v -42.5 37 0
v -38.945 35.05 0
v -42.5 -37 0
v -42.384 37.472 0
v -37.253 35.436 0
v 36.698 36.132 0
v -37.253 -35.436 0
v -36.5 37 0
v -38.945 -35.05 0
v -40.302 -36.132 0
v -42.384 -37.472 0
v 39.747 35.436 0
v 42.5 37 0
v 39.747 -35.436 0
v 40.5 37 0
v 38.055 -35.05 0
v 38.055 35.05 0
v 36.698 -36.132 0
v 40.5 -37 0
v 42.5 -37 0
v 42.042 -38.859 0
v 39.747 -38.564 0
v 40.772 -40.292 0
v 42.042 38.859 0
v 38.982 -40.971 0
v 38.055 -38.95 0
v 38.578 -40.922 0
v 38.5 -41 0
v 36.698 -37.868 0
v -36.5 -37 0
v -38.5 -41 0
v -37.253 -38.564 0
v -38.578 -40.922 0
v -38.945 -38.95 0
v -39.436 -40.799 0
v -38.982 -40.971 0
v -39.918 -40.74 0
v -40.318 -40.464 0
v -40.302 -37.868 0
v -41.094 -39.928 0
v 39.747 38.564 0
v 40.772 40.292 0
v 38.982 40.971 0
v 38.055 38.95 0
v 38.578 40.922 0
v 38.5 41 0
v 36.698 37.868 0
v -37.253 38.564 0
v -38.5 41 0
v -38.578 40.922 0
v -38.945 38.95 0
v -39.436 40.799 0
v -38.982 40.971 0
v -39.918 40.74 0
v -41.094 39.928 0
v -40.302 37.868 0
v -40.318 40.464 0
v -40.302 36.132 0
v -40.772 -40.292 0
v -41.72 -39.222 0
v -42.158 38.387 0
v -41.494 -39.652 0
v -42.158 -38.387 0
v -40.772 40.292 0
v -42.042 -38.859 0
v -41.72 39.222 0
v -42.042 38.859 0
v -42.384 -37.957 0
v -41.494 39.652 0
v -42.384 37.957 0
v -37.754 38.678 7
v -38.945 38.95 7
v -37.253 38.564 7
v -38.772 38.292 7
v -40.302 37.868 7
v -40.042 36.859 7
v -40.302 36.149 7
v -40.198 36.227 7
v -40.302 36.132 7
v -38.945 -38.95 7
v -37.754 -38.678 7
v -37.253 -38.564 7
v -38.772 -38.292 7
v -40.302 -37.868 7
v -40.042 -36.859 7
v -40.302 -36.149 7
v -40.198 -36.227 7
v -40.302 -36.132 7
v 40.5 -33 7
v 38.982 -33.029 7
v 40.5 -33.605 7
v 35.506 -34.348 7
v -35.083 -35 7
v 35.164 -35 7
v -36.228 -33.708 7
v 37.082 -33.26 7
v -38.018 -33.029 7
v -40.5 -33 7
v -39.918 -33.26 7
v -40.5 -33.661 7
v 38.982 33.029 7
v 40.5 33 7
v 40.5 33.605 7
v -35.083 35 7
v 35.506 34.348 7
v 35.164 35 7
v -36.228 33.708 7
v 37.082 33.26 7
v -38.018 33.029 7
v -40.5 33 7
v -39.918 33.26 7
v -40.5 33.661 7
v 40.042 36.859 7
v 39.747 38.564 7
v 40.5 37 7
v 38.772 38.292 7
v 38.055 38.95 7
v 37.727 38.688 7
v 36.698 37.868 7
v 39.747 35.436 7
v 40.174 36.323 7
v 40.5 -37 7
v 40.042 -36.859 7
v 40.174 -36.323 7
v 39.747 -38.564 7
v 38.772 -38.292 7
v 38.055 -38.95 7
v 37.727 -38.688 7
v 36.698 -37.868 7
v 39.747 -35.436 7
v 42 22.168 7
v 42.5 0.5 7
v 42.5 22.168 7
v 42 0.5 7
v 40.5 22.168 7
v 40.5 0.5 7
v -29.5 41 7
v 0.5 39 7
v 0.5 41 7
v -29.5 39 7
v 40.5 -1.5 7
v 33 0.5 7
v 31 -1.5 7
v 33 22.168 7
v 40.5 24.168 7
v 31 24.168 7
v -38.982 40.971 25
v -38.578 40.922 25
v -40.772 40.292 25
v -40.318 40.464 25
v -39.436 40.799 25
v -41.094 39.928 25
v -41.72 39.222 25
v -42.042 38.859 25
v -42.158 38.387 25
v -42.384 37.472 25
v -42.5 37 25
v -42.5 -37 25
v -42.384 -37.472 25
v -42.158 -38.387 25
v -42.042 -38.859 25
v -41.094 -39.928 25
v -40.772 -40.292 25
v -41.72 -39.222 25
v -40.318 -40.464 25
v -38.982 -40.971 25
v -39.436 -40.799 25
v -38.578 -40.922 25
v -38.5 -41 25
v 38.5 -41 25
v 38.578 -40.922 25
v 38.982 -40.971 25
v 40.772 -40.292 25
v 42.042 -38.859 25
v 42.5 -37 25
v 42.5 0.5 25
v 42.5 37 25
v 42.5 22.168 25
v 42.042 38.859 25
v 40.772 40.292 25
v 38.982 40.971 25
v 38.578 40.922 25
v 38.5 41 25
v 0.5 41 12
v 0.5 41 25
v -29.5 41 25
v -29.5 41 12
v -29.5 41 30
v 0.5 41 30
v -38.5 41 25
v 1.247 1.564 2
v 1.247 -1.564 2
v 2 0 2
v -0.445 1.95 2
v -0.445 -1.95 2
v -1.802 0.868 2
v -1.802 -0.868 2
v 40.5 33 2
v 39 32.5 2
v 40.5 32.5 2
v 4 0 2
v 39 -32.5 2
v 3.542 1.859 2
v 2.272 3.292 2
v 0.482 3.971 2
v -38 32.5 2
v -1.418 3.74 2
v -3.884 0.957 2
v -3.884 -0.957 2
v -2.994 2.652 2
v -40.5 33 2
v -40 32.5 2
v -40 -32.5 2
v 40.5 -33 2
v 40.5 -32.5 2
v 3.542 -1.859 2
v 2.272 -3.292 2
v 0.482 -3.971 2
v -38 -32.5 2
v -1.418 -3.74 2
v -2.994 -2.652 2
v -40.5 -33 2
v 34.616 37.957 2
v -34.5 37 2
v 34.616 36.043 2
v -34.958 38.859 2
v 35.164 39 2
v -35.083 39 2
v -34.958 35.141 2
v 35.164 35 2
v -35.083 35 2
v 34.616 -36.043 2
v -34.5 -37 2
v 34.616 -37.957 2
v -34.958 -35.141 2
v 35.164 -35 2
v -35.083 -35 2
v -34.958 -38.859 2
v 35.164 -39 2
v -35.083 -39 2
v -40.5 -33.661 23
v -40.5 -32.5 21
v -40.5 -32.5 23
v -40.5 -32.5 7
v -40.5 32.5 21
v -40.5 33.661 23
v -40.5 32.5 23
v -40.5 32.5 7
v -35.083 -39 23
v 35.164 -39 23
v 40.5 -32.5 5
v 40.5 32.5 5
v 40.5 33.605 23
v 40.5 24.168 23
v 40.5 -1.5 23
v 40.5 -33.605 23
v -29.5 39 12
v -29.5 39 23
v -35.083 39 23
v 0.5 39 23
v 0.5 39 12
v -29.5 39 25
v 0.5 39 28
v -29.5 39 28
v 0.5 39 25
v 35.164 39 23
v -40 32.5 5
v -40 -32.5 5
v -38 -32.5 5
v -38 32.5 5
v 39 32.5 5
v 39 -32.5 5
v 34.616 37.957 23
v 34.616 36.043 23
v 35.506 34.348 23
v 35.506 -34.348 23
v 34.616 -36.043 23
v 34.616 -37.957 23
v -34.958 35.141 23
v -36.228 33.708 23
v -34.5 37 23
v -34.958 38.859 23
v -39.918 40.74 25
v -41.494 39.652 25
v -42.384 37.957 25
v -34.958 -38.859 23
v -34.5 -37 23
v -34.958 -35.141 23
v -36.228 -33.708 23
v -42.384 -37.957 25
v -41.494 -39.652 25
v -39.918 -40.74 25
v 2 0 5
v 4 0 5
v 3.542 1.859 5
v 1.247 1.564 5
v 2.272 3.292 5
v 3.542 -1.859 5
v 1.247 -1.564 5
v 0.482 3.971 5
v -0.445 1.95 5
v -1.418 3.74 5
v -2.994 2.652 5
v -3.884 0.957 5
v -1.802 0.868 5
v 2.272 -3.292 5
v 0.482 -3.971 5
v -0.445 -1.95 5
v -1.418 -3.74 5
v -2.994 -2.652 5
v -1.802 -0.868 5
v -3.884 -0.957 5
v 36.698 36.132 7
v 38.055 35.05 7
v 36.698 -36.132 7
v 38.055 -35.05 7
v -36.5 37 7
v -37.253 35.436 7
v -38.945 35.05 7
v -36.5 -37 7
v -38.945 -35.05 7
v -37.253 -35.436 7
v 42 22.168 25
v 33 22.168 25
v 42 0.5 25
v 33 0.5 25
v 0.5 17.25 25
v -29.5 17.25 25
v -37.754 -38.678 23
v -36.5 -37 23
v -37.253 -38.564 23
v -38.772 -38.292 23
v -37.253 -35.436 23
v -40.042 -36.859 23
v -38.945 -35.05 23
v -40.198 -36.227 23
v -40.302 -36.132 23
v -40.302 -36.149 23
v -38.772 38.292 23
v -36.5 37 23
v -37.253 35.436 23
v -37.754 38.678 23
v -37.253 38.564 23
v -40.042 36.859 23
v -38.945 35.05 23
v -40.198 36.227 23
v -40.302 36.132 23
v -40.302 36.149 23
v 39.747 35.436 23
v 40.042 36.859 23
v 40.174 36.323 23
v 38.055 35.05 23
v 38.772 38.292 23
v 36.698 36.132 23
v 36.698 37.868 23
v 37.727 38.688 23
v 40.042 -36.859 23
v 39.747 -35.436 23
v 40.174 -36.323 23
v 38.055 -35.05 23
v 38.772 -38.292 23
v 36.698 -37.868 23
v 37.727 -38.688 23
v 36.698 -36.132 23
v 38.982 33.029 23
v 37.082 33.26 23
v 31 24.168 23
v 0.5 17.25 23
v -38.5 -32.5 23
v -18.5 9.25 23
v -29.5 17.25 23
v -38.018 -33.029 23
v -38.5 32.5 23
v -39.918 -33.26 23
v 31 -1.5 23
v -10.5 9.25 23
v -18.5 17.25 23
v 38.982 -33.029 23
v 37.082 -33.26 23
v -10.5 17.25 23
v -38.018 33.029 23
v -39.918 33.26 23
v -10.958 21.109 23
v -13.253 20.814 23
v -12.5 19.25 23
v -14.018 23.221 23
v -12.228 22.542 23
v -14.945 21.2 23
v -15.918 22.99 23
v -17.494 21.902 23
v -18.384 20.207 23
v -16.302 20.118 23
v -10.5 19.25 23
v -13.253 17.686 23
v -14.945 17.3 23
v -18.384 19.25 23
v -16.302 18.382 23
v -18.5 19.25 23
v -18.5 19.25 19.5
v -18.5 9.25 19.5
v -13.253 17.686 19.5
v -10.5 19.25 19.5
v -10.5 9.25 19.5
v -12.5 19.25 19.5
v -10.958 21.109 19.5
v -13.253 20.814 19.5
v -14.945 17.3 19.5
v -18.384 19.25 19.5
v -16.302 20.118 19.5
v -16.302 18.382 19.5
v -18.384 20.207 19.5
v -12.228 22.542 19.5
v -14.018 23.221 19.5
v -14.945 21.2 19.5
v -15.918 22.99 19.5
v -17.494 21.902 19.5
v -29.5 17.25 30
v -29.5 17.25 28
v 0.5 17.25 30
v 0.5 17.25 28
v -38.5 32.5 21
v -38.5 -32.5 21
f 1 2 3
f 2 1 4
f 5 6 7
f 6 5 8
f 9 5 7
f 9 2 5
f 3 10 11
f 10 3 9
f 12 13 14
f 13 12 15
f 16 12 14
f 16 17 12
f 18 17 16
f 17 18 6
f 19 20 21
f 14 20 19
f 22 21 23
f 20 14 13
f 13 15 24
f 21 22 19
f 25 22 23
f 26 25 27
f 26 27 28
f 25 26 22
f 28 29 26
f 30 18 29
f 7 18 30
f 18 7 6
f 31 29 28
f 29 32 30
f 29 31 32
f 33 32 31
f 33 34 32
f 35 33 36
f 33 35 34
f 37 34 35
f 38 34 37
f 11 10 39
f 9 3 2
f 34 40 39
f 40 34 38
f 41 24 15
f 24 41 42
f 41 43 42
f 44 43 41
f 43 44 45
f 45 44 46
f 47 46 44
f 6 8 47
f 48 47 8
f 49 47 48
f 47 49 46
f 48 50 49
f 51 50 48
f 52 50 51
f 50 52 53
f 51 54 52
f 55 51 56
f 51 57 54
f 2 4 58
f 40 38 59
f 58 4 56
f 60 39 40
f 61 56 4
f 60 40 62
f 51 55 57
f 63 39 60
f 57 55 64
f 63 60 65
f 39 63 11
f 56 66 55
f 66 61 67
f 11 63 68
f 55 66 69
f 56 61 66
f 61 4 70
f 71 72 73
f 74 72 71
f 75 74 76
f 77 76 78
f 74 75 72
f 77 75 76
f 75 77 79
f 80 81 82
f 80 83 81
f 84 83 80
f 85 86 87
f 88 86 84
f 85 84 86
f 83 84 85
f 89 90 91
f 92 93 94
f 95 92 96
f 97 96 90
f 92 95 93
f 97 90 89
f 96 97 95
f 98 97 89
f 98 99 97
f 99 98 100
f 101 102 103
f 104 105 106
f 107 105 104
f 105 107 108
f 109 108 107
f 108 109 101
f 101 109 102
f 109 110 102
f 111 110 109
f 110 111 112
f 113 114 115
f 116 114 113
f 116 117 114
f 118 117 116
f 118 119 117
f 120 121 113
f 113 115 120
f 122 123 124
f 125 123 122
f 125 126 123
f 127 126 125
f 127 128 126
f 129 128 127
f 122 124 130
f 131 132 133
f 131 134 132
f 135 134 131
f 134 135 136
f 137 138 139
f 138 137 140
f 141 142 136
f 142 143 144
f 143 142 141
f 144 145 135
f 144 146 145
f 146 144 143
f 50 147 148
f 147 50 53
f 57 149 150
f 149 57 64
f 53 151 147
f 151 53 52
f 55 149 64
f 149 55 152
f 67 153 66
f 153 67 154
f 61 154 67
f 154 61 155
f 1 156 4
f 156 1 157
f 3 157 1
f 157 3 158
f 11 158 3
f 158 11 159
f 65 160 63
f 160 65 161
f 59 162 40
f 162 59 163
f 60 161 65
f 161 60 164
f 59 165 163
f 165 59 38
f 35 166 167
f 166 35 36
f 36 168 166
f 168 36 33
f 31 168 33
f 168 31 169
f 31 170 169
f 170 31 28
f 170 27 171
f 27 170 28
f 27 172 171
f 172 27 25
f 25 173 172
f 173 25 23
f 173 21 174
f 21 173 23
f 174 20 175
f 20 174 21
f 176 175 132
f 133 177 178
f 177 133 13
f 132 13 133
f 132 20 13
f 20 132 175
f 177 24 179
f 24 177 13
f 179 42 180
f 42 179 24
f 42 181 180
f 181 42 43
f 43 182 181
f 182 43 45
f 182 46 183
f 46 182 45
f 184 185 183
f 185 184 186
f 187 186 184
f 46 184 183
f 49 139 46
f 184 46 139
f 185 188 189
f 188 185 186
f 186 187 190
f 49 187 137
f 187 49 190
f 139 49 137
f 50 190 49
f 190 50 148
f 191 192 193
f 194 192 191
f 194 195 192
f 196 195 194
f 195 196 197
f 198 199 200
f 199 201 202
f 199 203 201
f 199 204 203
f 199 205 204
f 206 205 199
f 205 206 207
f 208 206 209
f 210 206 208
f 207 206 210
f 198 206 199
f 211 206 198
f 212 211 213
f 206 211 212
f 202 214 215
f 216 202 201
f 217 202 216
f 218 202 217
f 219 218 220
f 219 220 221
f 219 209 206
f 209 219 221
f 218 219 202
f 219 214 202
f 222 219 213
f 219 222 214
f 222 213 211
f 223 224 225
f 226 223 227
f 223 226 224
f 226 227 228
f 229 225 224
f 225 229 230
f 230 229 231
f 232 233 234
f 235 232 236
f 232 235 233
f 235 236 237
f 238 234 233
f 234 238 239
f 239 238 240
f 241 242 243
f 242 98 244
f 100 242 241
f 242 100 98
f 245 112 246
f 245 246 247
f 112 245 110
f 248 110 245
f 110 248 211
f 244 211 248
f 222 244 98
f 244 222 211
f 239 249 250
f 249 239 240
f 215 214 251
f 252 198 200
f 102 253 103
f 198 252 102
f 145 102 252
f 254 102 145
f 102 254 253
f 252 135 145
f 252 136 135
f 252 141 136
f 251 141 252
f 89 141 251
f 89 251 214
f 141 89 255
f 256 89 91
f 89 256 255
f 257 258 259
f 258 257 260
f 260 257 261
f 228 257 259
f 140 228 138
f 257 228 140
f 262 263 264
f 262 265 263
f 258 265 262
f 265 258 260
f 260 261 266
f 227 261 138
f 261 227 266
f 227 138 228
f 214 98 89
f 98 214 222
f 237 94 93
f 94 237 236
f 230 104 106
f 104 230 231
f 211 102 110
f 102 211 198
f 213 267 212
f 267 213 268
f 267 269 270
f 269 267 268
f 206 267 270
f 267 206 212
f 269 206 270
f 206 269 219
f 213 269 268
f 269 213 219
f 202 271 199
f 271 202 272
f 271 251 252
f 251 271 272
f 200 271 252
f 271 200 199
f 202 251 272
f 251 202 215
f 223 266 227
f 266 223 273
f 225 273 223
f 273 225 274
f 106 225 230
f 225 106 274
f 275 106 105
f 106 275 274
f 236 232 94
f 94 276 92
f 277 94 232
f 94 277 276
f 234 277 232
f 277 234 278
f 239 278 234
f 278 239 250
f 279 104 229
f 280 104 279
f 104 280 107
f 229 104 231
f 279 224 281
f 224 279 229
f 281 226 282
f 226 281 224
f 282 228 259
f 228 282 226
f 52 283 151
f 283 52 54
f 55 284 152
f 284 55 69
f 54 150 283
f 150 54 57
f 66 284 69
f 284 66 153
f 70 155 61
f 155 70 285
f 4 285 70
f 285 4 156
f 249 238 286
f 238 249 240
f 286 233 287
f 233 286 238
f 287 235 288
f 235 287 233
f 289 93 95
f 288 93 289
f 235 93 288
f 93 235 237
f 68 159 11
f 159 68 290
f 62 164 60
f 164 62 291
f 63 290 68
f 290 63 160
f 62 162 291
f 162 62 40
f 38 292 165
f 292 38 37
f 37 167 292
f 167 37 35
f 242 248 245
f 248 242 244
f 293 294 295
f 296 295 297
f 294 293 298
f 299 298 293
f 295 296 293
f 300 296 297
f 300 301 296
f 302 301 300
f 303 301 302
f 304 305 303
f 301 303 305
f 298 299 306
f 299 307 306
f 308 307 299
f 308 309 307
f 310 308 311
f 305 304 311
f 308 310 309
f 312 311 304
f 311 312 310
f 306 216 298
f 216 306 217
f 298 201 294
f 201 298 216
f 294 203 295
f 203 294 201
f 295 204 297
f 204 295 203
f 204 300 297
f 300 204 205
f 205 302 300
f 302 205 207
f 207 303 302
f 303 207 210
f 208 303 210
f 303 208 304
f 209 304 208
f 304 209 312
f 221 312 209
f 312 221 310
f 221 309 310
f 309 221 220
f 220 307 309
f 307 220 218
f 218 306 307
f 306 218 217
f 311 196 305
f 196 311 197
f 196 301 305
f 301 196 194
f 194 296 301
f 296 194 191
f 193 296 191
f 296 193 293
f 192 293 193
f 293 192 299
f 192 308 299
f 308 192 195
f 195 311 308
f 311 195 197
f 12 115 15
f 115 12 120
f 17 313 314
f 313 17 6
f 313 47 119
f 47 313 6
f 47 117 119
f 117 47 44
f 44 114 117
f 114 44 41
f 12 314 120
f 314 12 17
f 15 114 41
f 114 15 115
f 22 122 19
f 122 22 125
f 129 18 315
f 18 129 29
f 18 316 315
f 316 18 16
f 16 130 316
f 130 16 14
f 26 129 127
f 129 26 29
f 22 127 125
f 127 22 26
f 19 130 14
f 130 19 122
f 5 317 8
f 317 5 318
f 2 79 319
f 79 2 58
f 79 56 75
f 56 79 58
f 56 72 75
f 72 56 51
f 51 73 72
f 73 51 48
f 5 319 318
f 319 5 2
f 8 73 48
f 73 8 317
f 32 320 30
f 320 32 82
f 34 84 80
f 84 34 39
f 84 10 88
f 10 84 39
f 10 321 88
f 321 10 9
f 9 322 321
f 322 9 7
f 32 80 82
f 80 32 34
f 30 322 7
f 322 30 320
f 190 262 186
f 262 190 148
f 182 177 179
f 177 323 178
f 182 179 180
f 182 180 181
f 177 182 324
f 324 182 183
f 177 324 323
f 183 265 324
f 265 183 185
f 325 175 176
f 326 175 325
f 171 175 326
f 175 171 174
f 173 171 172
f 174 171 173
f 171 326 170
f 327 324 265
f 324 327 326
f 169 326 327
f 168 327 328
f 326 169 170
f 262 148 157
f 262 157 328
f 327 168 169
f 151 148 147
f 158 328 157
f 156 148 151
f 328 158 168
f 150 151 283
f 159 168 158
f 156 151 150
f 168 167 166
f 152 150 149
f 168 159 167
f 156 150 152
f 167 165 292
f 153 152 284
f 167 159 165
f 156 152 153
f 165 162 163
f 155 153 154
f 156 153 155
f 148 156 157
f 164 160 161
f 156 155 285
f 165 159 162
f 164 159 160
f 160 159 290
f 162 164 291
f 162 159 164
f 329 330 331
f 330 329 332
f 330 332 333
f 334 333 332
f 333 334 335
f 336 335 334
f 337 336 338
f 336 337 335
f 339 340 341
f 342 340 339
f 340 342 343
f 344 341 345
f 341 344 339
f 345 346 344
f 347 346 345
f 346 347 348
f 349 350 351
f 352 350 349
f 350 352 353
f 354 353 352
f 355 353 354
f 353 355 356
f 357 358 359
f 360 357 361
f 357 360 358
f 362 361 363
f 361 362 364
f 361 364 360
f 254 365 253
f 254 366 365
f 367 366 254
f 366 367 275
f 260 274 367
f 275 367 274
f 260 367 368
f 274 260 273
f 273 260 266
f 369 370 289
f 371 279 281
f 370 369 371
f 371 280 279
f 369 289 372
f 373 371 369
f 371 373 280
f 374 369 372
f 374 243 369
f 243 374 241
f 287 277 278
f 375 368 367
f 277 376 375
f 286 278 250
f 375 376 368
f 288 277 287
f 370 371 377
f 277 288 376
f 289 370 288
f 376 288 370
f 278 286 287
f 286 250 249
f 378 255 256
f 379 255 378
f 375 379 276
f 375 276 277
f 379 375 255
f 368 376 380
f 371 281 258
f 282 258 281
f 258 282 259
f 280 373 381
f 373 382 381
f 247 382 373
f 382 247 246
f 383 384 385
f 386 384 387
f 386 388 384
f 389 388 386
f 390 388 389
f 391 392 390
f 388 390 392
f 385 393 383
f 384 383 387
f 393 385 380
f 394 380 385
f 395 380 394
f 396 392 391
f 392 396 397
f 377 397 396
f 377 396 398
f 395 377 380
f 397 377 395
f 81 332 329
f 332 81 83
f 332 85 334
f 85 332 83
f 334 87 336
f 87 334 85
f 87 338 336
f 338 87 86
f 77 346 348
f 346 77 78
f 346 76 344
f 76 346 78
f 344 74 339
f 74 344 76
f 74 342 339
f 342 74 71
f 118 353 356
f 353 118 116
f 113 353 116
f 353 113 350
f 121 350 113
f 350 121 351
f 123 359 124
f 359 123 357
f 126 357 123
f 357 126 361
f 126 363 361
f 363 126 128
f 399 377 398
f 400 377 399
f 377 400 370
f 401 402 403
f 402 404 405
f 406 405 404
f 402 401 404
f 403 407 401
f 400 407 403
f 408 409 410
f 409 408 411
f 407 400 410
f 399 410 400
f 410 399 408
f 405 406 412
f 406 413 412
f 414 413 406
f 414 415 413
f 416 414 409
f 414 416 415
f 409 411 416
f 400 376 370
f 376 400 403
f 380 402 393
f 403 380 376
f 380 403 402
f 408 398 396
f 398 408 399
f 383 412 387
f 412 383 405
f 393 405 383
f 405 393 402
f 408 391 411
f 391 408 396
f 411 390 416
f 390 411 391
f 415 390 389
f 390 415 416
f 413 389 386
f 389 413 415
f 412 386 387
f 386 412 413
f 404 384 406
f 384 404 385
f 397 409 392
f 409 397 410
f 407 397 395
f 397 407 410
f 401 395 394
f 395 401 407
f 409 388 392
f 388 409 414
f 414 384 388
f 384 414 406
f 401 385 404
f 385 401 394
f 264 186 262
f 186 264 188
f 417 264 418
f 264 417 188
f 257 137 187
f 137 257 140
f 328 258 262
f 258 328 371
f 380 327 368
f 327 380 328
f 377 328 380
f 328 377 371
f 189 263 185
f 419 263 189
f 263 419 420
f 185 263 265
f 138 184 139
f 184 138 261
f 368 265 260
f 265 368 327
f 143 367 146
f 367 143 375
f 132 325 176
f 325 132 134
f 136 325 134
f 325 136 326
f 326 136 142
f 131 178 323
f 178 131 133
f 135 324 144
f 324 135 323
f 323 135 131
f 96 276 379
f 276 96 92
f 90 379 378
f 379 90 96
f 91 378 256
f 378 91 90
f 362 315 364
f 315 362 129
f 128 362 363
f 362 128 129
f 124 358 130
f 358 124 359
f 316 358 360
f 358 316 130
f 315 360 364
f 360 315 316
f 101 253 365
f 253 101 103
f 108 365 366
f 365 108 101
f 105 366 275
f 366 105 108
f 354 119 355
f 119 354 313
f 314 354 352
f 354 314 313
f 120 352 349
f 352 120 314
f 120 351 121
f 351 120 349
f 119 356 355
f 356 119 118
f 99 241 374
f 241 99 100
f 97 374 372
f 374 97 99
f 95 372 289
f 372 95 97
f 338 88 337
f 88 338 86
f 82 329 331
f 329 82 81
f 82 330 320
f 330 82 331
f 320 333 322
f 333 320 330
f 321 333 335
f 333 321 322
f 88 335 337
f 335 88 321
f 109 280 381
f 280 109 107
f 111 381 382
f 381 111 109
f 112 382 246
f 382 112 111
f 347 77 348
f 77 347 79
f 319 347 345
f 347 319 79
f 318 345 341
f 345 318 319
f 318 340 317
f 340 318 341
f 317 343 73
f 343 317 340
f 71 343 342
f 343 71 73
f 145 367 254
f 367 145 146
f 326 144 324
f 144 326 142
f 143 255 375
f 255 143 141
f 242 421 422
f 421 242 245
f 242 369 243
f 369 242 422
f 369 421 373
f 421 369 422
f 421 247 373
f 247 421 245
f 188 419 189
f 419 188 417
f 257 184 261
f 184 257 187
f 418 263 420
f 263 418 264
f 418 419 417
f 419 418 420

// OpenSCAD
// file: ChassisTop.scad
// This is model of top chassis.

// below values are taken from KiCad model

SCREW_CONNECTOR_DX = 10 + COMPONENT_TOLERANCE;
SCREW_CONNECTOR_Y = 1 - COMPONENT_TOLERANCE;
SCREW_CONNECTOR_DY = 20.668 + 2*COMPONENT_TOLERANCE;

AdcPowerSupplyYOffset = PCB_X/2
                        - SCREW_CONNECTOR_DX
                        + CHASSIS_THICKNESS
                        - COMPONENT_TOLERANCE;

module ChassisTop_WallsAroundADCAndPowerSupplySocket(Height)
{
    linear_extrude(height = Height, convexity = 10, twist = 0)
    {
        translate([AdcPowerSupplyYOffset,
                    -SCREW_CONNECTOR_DY - SCREW_CONNECTOR_Y - CHASSIS_THICKNESS,
                    0])
        {
            square([SCREW_CONNECTOR_DX + COMPONENT_TOLERANCE, CHASSIS_THICKNESS]);
        }

        translate([AdcPowerSupplyYOffset,
                    -SCREW_CONNECTOR_DY - SCREW_CONNECTOR_Y + SCREW_CONNECTOR_DY,
                    0])
        {
            square([SCREW_CONNECTOR_DX + COMPONENT_TOLERANCE, CHASSIS_THICKNESS]);
        }

        translate([AdcPowerSupplyYOffset,
                    -SCREW_CONNECTOR_DY - SCREW_CONNECTOR_Y,
                    0])
        {
            square([CHASSIS_THICKNESS, SCREW_CONNECTOR_DY + CHASSIS_THICKNESS]);
        }
    }
}

module ChassisTop_SupportFrontPanel()
{
    translate([-PCB_X/2 -COMPONENT_TOLERANCE,
               -PCB_Y/2,
                CHASSIS_THICKNESS])
    {
        linear_extrude(height = CHASSIS_THICKNESS, convexity = 10, twist = 0)
        {
            square([CHASSIS_THICKNESS, PCB_Y]);
        }
    }

}

module ChassisTop_DebugPanelMountingScrewSupport()
{

    DebugPanelSupportSize = 10;

    translate([-PCB_X/2+DEBUG_CONNECTOR_X+DEBUG_CONNECTOR_DX/2,
            -PCB_Y/2+DEBUG_CONNECTOR_DY/2+COMPONENT_TOLERANCE,
            0])
    {
        difference()
        {
            union()
            {
                translate([0,DebugPanelSupportSize/2,0])
                {
                    linear_extrude(height = CHASSIS_THICKNESS+INSERT_NUT_LENGTH, convexity = 10, twist = 0)
                    {
                        square([INSERT_NUT_HOLDER_DIAMETER, DebugPanelSupportSize], center=true);
                    }
                }
                GenericChassis_InsertNutSocket(CHASSIS_THICKNESS+INSERT_NUT_LENGTH, false);
            }

            // add hole for debug socket screw
            linear_extrude(height = CHASSIS_THICKNESS+INSERT_NUT_LENGTH, convexity = 10, twist = 0)
            {
                circle(r=INSERT_NUT_RADIUS);
            }
        }
    }
}

module Chassis3DTop(Height)
{
    difference()
    {
        union()
        {
            GenericChassis(Height);
            ChassisTop_DebugPanelMountingScrewSupport();
        }

        // add hole for ADC and power supply socket
        translate([AdcPowerSupplyYOffset,
                    -SCREW_CONNECTOR_DY - SCREW_CONNECTOR_Y,
                    0])
        {
            linear_extrude(height = Height, convexity = 10, twist = 0)
            {
                square([SCREW_CONNECTOR_DX + CHASSIS_THICKNESS, SCREW_CONNECTOR_DY]);
            }
        }

        // add hole for flashing and UART sockets
        DebugPanel(Height);

        // add hole for front pannel
        translate([-PCB_X/2 - CHASSIS_THICKNESS-COMPONENT_TOLERANCE,
                   -PCB_Y/2,
                    CHASSIS_THICKNESS])
        {
            GenericFrontPanel();
        }
    }

    ChassisTop_WallsAroundADCAndPowerSupplySocket(Height);
    ChassisTop_SupportFrontPanel();

    // add nounting screws
    InsertNutSockets(Height, false);
}
// file: ChassisBottom.scad
// This is model of bottom chassis.

module ChassisBottom_FrontPanel(Height)
{
    translate([-PCB_X/2 - CHASSIS_THICKNESS-COMPONENT_TOLERANCE,
                -PCB_Y/2,
                Height])
    {
        GenericFrontPanel();
    }
}

module ChassisBottom_SupportAroundPCB()
{
    linear_extrude(height = 2*CHASSIS_THICKNESS+PCB_Z_OFFSET, convexity = 10, twist = 0)
    {
        square([PCB_X+2*COMPONENT_TOLERANCE, CHASSIS_THICKNESS]);
    }
}

module ChassisBottom_SupportsAroundPCB()
{
    translate([-PCB_X/2 -COMPONENT_TOLERANCE,
                -PCB_Y/2-CHASSIS_THICKNESS-COMPONENT_TOLERANCE,
                0])
    {
        ChassisBottom_SupportAroundPCB();
    }

    translate([-PCB_X/2 - COMPONENT_TOLERANCE,
                PCB_Y/2+COMPONENT_TOLERANCE,
                0])
    {
        ChassisBottom_SupportAroundPCB();
    }
}

module ChassisBottom_PCBMountingHole()
{
    translate([0,
                0,
                CHASSIS_THICKNESS])
    {
        GenericChassis_InsertNutSocket(PCB_Z_OFFSET, false);
    }
}

module ChassisBottom_PCBBottomHolder()
{
    PCBBottomHolderThickness = 2;

    linear_extrude(height = PCB_Z_OFFSET, convexity = 10, twist = 0)
    {
        square([PCBBottomHolderThickness, PCB_Y]);
    }
}

module ChassisBottom_PCBBottomHolders()
{
    translate([-PCB_X/2,
                -PCB_Y/2,
                CHASSIS_THICKNESS])
    {
        ChassisBottom_PCBBottomHolder();
    }

    translate([PCB_X/2-1,
                -PCB_Y/2,
                CHASSIS_THICKNESS])
    {
        ChassisBottom_PCBBottomHolder();
    }
}

module ChassisBottom(Height)
{
    difference()
    {
        union()
        {
            GenericChassis(Height);
            ChassisBottom_FrontPanel(Height);
            ChassisBottom_SupportsAroundPCB();
            ChassisBottom_PCBMountingHole();
            ChassisBottom_PCBBottomHolders();

            InsertNutSockets(Height, false);
        }

        // add mounting for top and bottom chassis
        InsertNutSockets(Height, true);
    }
}
// file: GenericFrontPanel.scad
// This is model of panel where BNC, LCD and encoder are.

module GenericFrontPanel()
{
    linear_extrude(height = TOP_CHASSIS_HEIGHT-CHASSIS_THICKNESS, convexity = 10, twist = 0)
    {
        square([CHASSIS_THICKNESS, PCB_Y]);
    }
}
// file: GenericChassis.scad
module Chassis2DQuarter(Thickness)
{
    CHASSIS_X = PCB_X/2 + COMPONENT_TOLERANCE + Thickness;
    CHASSIS_Y = PCB_Y/2 + COMPONENT_TOLERANCE + Thickness;

    polygon(points=[
        [0, 0],
        [CHASSIS_X, 0],
        [CHASSIS_X, CHASSIS_Y + CHASSIS_CORNER_DIAMETER/2 - Thickness/2],
        [CHASSIS_X - CHASSIS_CORNER_RADIUS - CHASSIS_THICKNESS/2, CHASSIS_Y + CHASSIS_CORNER_DIAMETER],
        [0, CHASSIS_Y + CHASSIS_CORNER_DIAMETER],
    ]);

    translate([CHASSIS_X - CHASSIS_THICKNESS - INSERT_NUT_RADIUS,
            CHASSIS_Y + INSERT_NUT_RADIUS,
            0])
    {
        circle(r=INSERT_NUT_RADIUS + CHASSIS_THICKNESS);
    }
}

module Chassis2DHalf(Thickness)
{
    Chassis2DQuarter(Thickness);

    rotate([180, 0, 0])
    {
        Chassis2DQuarter(Thickness);
    }
}

module GenericChassis2D(Thickness)
{
    Chassis2DHalf(Thickness);

    rotate([0, 180, 0])
    {
        Chassis2DHalf(Thickness);
    }
}



module GenericChassis_InsertNutSocket(Height, isFull)
{
    linear_extrude(height = Height, convexity = 10, twist = 0)
    {
        difference()
        {
            if(!isFull)
            {
                circle(r=INSERT_NUT_RADIUS + CHASSIS_THICKNESS);
            }

            circle(r=INSERT_NUT_RADIUS);
        }
    }
}

module InsertNutSockets(Height, isFull)
{
    Thickness = CHASSIS_THICKNESS;
    CHASSIS_X = PCB_X/2 + COMPONENT_TOLERANCE + Thickness;
    CHASSIS_Y = PCB_Y/2 + COMPONENT_TOLERANCE + Thickness;

    translate([CHASSIS_X - Thickness - INSERT_NUT_RADIUS,
            CHASSIS_Y + INSERT_NUT_RADIUS,
            0])
    {
        GenericChassis_InsertNutSocket(Height, isFull);
    }

    translate([CHASSIS_X - Thickness - INSERT_NUT_RADIUS,
            -CHASSIS_Y - INSERT_NUT_RADIUS,
            0])
    {
        GenericChassis_InsertNutSocket(Height, isFull);
    }

    translate([-CHASSIS_X + Thickness + INSERT_NUT_RADIUS,
            CHASSIS_Y + INSERT_NUT_RADIUS,
            0])
    {
        GenericChassis_InsertNutSocket(Height, isFull);
    }

    translate([-CHASSIS_X + Thickness + INSERT_NUT_RADIUS,
            -CHASSIS_Y - INSERT_NUT_RADIUS,
            0])
    {
        GenericChassis_InsertNutSocket(Height, isFull);
    }
}

module GenericChassis(Height)
{
    difference()
    {
        linear_extrude(height = Height, convexity = 10, twist = 0)
        {
            GenericChassis2D(CHASSIS_THICKNESS);
        }

        translate([0, 0, CHASSIS_THICKNESS])
        {
            linear_extrude(height = Height - CHASSIS_THICKNESS, convexity = 10, twist = 0)
            {
                GenericChassis2D(0);
            }
        }
    }
}
// main file
COMPONENT_TOLERANCE = 0.5; // compensate for printer tolerances

PCB_THICKNESS = 2;
PCB_X = 80;
PCB_Y =  65;

BOTTOM_CHASSIS_HEIGHT = 7;
TOP_CHASSIS_HEIGHT=25-BOTTOM_CHASSIS_HEIGHT;

CHASSIS_THICKNESS = 2;

PCB_Z_OFFSET = 3; // 3mm for PCB cearance between PCB and chassis

INSERT_NUT_DIAMETER=3.5;
INSERT_NUT_RADIUS=(INSERT_NUT_DIAMETER + COMPONENT_TOLERANCE)/2;
INSERT_NUT_LENGTH=3.5;
INSERT_NUT_HOLDER_RADIUS=INSERT_NUT_RADIUS + CHASSIS_THICKNESS;
INSERT_NUT_HOLDER_DIAMETER= 2*INSERT_NUT_HOLDER_RADIUS;

CHASSIS_CORNER_RADIUS = INSERT_NUT_RADIUS + CHASSIS_THICKNESS/2;
CHASSIS_CORNER_DIAMETER= 2*CHASSIS_CORNER_RADIUS;


DEBUG_CONNECTOR_X = 11 - COMPONENT_TOLERANCE;
DEBUG_CONNECTOR_DX = 29 + 2*COMPONENT_TOLERANCE;
DEBUG_CONNECTOR_DY = /*18*/20 + CHASSIS_CORNER_DIAMETER - COMPONENT_TOLERANCE;

include <GenericChassis.scad>;
include <GenericFrontPanel.scad>;
include <ChassisBottom.scad>;
include <ChassisTop.scad>;

// Increase steps in render to have quality circles
//$fs=0.1;
//$fn=30;


module PCB()
{
   import("PCB.stl");
}

module DebugPanelBasic(Height)
{
    translate([-PCB_X/2+DEBUG_CONNECTOR_X,
                ,-PCB_Y/2
                    + COMPONENT_TOLERANCE
                    - 2*CHASSIS_THICKNESS // TODO this is wrong
                    - DEBUG_CONNECTOR_DY/2
                    + CHASSIS_CORNER_DIAMETER,
                0])
    {
        linear_extrude(height = Height, convexity = 10, twist = 0)
        {
            square([DEBUG_CONNECTOR_DX, DEBUG_CONNECTOR_DY]);
        }
    }
}

module DebugPanel(Height)
{
    difference()
    {
        GenericChassis(Height);

        difference()
        {
            GenericChassis(Height);
            DebugPanelBasic(Height);
        }
    }
}


module Render_DebugPanel()
{
    color("green")
    {
        translate([0,0,BOTTOM_CHASSIS_HEIGHT + TOP_CHASSIS_HEIGHT+5])
        {
            rotate([180,0,0])
            {
                DebugPanel(TOP_CHASSIS_HEIGHT);
            }
        }
    }
}

module Render_PCB()
{
    translate([0, 0, PCB_Z_OFFSET+CHASSIS_THICKNESS])
    {
        PCB();
    }
}

module Render_BottomChassis()
{
    color("salmon")
    {
        ChassisBottom(BOTTOM_CHASSIS_HEIGHT);
    }
}

module Render_TopChassis()
{
    color("yellow")
    {
        translate([0,0,BOTTOM_CHASSIS_HEIGHT + TOP_CHASSIS_HEIGHT])
        {
            rotate([180,0,0])
            {
                Chassis3DTop(TOP_CHASSIS_HEIGHT);
            }
        }
    }
}

test1=true;
//test1=false;
if (test1)
{
//Render_PCB();
Render_BottomChassis();
Render_TopChassis();
Render_DebugPanel();
}
else{
//Render_PCB();
ChassisTop(TOP_CHASSIS_HEIGHT);
}
